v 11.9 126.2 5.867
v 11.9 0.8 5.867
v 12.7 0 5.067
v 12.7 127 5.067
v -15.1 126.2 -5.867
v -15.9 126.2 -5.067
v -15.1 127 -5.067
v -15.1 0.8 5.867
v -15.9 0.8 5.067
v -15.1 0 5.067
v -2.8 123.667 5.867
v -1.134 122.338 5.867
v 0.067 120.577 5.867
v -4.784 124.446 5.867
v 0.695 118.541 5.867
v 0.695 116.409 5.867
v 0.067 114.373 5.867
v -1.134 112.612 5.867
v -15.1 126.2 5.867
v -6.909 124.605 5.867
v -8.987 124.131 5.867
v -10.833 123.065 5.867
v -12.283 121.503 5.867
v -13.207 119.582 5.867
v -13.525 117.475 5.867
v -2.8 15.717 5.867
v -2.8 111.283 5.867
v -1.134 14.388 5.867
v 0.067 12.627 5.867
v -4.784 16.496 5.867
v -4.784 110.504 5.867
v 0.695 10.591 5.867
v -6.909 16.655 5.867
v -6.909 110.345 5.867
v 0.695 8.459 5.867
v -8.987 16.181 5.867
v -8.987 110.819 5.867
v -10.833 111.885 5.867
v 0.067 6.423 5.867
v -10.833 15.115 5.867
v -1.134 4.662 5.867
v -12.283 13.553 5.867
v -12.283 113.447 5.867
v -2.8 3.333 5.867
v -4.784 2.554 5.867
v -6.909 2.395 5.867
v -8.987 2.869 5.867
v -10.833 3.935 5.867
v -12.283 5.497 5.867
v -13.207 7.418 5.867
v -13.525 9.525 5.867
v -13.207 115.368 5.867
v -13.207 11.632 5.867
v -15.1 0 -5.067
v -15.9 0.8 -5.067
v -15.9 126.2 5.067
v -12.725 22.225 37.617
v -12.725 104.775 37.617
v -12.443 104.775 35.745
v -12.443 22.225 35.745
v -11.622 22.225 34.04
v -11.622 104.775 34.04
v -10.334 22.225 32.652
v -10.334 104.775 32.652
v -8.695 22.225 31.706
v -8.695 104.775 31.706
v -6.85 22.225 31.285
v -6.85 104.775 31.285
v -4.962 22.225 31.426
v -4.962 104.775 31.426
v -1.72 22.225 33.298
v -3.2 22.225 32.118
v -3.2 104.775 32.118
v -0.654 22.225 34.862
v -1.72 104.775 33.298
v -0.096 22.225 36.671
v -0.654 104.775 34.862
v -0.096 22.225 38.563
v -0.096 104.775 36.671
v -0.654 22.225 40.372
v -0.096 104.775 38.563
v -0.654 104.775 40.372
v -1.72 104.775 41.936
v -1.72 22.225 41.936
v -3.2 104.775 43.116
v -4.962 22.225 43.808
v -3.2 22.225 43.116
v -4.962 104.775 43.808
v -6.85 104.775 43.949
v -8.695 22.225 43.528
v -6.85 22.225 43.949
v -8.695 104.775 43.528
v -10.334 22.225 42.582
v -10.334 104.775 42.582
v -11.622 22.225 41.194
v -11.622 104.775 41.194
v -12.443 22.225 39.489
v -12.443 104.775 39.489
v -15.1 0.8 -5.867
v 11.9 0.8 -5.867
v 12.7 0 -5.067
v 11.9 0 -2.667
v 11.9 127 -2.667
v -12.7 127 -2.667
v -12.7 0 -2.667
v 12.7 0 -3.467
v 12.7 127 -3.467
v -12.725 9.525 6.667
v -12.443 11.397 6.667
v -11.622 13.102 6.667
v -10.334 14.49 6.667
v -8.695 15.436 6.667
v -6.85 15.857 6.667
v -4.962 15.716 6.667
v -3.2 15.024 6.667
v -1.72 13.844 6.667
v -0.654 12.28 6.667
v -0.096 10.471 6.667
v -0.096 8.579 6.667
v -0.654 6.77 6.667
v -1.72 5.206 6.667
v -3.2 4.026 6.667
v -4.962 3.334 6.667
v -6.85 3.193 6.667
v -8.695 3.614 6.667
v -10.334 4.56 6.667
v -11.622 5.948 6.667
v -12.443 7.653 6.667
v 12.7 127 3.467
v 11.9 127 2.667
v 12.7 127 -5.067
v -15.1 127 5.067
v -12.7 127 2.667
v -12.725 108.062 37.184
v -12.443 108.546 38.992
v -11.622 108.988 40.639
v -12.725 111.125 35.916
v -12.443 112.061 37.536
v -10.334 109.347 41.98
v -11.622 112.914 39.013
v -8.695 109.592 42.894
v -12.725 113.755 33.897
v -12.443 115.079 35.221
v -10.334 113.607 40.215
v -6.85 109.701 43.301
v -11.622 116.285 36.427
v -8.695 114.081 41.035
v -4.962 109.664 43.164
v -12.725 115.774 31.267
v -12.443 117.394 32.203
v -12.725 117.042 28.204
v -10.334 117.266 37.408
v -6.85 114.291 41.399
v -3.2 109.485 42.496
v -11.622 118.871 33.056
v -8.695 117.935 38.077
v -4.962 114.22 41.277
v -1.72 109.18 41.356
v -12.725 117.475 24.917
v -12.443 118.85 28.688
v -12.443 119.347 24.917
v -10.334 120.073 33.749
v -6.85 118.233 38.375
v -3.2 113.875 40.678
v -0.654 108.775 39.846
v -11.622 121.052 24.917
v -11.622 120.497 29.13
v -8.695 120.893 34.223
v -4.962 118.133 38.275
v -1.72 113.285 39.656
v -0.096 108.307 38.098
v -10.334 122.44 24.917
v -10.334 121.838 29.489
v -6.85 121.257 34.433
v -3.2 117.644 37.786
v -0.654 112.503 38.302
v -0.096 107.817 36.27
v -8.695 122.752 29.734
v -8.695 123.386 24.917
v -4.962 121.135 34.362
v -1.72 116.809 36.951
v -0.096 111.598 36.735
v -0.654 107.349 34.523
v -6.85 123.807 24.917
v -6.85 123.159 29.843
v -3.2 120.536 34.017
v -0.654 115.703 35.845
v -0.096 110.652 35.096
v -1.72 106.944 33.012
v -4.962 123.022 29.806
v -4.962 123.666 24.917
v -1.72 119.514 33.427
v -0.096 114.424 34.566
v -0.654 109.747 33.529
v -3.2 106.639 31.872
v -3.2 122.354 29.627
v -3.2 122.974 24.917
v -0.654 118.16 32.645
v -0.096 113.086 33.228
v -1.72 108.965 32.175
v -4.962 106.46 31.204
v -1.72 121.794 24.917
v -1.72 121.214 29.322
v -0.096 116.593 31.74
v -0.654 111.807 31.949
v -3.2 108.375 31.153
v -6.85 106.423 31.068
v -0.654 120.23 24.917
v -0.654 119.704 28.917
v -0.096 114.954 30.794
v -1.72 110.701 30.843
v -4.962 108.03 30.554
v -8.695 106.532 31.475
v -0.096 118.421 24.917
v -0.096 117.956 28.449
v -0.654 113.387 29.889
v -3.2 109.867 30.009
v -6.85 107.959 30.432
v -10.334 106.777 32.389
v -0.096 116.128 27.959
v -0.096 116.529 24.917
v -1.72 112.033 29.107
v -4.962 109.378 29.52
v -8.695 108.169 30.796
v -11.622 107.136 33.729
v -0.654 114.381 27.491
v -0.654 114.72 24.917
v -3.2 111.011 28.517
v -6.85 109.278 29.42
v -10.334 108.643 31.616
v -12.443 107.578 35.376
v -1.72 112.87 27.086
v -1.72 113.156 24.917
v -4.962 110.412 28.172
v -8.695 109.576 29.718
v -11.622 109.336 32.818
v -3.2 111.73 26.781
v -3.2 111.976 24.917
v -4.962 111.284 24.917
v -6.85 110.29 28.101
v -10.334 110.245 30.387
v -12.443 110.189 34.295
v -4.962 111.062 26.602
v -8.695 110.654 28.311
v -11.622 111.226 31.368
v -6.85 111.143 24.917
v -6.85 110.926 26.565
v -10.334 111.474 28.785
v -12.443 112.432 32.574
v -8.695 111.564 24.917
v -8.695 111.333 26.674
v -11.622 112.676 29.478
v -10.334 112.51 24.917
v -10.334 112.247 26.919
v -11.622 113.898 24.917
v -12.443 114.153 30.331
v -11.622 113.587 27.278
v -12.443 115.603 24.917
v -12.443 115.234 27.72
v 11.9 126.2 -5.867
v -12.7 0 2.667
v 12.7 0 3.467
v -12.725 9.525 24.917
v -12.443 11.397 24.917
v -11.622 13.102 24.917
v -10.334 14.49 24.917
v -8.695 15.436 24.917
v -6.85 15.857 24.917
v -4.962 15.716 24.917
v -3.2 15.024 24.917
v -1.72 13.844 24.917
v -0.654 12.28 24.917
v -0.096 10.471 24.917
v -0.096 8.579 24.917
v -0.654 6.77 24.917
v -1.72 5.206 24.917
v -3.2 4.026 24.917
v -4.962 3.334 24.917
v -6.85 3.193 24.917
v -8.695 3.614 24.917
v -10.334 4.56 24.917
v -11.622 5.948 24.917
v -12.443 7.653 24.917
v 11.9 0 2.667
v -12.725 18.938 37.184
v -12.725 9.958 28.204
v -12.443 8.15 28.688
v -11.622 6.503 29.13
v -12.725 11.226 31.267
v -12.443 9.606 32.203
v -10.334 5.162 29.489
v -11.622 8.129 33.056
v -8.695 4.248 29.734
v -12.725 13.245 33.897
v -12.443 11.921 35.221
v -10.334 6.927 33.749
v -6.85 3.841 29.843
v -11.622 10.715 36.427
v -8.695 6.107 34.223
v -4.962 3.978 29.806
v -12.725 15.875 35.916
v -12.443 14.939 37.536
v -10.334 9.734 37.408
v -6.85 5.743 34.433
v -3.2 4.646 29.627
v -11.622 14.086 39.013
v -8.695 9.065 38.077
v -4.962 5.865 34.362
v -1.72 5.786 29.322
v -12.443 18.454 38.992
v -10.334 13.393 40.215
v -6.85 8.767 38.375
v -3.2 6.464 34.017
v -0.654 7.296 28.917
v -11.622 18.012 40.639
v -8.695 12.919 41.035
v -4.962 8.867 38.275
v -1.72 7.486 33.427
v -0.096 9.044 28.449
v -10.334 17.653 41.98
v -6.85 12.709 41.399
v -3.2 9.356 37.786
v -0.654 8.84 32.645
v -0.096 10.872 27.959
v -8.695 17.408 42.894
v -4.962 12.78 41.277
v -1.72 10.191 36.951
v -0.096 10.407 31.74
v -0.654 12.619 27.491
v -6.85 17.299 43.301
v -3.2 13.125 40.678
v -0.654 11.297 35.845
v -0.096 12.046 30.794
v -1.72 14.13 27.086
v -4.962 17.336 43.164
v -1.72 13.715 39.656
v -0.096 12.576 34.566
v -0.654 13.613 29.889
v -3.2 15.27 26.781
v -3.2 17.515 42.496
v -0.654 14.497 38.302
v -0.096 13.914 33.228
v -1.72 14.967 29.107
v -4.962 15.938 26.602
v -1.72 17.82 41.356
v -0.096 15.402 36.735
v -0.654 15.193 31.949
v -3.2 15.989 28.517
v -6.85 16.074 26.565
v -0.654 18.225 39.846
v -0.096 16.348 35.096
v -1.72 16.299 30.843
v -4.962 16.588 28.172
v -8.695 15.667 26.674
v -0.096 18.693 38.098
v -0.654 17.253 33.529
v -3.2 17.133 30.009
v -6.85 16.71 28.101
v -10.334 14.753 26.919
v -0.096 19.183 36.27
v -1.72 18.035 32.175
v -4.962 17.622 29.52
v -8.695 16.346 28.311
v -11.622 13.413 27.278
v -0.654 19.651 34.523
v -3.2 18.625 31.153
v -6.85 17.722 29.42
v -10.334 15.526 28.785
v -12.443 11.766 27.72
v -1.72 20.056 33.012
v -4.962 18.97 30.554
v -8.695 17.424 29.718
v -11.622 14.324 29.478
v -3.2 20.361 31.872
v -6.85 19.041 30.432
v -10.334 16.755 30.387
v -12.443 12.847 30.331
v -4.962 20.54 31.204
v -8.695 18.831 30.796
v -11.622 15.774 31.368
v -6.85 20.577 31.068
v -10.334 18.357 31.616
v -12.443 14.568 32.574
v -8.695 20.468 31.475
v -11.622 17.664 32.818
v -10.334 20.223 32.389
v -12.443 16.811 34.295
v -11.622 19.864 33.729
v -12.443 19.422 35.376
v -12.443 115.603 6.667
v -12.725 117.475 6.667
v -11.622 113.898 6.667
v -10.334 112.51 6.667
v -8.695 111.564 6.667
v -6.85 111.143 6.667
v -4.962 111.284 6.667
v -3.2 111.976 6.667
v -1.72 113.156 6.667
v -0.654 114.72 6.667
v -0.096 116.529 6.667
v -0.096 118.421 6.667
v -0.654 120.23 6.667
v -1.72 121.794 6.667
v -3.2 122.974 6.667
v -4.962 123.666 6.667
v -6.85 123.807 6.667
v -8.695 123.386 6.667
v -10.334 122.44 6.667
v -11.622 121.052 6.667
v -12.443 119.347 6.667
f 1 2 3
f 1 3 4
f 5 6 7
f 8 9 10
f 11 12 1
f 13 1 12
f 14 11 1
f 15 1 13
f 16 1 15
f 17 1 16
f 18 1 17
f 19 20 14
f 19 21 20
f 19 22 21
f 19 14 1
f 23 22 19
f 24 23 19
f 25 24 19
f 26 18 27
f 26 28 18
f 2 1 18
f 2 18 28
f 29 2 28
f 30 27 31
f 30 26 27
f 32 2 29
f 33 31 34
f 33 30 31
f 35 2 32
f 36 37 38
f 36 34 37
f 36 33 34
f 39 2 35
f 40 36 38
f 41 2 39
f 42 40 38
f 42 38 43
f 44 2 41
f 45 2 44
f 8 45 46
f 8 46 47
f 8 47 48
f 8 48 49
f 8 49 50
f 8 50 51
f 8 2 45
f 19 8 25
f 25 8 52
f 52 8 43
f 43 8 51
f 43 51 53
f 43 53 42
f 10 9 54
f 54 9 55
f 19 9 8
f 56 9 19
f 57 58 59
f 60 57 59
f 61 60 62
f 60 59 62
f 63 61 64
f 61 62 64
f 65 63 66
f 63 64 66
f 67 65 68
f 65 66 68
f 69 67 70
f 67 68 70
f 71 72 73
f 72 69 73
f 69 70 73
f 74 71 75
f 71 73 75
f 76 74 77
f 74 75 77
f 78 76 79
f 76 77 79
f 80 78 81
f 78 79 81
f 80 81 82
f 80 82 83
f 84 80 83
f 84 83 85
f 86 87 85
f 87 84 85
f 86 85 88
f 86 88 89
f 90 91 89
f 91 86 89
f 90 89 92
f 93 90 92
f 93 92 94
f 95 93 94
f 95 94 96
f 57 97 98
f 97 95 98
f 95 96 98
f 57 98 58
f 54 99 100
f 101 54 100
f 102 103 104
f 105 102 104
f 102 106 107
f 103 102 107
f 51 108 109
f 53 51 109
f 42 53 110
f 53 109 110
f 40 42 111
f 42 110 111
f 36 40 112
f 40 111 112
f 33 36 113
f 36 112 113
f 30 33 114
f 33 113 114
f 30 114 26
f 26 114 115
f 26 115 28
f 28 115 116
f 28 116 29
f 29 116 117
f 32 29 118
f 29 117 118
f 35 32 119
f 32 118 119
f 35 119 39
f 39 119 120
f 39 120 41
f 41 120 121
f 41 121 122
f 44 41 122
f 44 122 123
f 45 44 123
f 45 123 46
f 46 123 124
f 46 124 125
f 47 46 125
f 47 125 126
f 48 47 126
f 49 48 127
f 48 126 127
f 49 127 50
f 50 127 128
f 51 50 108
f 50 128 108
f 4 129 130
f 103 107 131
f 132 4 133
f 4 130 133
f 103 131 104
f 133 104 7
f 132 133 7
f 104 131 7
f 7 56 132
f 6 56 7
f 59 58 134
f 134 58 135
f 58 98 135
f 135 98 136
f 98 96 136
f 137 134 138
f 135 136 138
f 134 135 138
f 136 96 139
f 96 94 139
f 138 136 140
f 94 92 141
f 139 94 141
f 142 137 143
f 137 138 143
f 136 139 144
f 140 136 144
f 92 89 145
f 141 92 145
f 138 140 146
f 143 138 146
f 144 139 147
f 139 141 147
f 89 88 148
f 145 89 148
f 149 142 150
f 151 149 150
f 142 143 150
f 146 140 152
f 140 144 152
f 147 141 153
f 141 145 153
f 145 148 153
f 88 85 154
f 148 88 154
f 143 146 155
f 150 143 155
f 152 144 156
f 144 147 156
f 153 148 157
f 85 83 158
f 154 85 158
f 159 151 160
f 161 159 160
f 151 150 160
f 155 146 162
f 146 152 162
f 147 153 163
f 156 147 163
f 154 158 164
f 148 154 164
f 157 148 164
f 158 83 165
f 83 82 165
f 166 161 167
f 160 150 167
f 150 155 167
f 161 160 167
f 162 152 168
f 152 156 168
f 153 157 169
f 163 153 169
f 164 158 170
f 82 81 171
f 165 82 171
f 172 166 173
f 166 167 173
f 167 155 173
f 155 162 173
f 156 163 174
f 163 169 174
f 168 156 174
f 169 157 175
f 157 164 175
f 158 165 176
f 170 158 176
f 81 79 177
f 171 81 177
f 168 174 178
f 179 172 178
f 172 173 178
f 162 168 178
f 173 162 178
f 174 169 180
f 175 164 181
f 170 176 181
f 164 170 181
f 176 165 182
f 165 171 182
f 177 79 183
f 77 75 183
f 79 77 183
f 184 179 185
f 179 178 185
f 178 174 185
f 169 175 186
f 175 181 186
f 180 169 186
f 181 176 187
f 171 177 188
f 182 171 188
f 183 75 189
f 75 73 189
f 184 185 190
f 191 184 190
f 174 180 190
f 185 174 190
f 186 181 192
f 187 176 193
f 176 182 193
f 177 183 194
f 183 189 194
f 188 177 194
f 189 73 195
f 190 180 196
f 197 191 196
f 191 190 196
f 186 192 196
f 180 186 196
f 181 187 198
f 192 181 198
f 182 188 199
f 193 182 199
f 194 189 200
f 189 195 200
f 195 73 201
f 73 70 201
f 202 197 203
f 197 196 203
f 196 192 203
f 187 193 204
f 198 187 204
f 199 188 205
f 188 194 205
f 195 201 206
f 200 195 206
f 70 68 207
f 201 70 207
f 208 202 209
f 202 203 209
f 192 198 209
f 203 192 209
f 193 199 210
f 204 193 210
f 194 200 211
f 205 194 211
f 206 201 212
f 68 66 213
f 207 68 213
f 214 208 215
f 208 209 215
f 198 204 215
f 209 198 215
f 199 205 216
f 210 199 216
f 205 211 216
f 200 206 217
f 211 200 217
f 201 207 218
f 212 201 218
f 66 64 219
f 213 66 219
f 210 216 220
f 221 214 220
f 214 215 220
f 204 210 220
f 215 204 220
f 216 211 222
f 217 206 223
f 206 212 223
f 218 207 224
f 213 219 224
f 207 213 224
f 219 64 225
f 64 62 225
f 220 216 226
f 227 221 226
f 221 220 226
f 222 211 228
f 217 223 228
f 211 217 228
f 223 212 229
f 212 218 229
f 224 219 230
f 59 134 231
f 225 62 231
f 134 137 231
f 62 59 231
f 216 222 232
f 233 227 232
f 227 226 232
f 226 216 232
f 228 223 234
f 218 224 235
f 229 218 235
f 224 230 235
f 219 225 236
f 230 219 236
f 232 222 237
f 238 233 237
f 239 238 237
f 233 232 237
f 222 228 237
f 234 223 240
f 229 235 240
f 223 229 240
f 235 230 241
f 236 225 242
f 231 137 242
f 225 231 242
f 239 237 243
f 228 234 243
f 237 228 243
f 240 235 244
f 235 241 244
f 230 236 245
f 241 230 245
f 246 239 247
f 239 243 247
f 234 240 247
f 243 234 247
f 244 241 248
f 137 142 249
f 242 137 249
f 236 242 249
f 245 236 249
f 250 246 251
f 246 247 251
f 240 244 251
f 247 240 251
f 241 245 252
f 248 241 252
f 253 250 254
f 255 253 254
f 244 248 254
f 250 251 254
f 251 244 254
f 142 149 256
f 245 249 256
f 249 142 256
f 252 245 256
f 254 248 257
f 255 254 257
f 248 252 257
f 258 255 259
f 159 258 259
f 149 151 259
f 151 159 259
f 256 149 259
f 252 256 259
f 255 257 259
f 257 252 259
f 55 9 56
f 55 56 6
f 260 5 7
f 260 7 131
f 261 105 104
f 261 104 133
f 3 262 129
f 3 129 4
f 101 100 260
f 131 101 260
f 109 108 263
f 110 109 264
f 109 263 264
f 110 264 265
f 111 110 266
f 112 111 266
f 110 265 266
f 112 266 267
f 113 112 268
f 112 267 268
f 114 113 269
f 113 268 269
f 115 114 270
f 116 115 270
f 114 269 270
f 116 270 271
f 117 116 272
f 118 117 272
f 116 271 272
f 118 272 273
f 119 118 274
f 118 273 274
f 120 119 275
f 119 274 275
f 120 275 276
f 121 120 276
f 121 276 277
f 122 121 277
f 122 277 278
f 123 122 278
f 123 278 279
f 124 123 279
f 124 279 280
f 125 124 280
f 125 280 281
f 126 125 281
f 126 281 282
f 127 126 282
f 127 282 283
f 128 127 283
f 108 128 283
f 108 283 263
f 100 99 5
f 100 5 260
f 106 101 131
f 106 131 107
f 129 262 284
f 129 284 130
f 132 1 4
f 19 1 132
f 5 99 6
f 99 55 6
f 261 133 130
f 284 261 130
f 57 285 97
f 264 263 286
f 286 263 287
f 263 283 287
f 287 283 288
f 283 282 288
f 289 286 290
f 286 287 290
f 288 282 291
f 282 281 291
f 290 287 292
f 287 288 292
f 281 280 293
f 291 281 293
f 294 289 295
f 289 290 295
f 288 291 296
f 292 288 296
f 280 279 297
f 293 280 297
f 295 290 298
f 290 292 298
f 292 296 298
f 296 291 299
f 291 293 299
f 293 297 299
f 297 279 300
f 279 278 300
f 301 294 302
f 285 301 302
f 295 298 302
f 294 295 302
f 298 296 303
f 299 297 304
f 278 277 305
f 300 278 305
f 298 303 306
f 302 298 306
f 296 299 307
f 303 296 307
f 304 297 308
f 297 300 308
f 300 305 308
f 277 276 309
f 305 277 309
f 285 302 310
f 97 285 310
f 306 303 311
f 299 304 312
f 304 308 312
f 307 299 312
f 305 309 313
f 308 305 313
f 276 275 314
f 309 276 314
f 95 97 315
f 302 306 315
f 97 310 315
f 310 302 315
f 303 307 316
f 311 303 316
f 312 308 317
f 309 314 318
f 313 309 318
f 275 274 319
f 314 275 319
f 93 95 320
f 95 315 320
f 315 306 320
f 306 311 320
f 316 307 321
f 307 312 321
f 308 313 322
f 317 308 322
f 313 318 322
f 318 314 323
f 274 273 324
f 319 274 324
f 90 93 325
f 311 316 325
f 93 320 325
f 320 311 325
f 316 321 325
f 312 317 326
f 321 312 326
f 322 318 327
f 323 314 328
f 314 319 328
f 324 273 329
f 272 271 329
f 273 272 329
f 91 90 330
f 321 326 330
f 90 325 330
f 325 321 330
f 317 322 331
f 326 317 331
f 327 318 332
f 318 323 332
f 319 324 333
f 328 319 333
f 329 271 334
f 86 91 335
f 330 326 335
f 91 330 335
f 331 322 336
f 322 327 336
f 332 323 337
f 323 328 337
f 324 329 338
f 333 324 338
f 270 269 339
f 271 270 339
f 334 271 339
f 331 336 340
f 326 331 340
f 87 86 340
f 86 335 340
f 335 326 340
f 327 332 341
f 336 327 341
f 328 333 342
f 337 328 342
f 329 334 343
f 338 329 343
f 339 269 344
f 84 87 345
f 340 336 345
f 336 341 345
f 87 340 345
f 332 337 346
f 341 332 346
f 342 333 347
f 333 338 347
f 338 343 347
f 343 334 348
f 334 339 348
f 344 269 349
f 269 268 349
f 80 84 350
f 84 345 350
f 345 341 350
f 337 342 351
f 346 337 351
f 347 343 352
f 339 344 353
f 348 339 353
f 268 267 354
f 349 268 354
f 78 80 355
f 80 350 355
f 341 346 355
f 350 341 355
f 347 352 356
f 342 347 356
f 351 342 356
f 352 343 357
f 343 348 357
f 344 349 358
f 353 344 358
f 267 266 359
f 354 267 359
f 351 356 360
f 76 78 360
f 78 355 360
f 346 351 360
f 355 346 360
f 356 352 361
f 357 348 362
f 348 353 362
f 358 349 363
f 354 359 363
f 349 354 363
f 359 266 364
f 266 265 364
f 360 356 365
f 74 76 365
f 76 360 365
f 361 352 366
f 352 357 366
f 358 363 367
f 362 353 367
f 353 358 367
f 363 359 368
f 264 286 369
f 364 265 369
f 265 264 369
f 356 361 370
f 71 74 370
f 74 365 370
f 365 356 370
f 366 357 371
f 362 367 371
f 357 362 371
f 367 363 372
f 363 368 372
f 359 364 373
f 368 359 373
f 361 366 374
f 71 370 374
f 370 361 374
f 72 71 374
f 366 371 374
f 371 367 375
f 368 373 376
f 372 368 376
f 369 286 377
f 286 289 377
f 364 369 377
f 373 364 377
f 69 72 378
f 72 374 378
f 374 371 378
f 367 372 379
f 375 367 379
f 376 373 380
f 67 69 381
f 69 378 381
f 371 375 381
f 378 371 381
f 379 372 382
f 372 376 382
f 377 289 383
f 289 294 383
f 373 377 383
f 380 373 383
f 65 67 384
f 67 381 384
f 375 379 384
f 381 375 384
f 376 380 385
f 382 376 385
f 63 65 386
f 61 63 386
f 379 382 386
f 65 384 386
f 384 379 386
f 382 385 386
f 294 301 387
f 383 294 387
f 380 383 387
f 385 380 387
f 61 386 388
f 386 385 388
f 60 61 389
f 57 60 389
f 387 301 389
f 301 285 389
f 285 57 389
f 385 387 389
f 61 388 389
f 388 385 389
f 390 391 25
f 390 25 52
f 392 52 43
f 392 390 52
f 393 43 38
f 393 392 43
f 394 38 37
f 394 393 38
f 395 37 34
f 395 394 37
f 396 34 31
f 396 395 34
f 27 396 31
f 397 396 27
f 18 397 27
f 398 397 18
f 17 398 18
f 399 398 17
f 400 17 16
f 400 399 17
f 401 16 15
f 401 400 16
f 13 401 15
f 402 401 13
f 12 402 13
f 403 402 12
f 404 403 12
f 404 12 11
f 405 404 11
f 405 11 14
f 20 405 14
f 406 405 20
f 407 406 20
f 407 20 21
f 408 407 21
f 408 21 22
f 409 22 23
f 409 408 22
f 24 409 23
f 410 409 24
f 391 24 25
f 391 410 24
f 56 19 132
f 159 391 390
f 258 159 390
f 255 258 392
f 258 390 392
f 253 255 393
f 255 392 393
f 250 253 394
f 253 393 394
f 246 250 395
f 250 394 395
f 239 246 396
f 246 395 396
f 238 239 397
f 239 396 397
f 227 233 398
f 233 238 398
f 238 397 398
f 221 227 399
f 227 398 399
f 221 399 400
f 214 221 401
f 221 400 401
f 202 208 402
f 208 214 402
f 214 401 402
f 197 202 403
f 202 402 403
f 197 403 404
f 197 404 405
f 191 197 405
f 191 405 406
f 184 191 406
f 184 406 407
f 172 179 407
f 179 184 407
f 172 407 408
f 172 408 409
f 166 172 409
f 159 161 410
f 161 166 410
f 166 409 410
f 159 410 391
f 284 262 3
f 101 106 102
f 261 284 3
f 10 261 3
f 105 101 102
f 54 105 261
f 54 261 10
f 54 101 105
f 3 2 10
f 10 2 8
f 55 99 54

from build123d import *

# Parameters (mm, degrees)
BOSS_EXTRUDE1_DEPTH = 127
SKETCH2_R           = 6.35
CHAMFER1_SIZE       = 0.8


with BuildPart() as part:
    # Sketch1 → Boss-Extrude1 (new body)
    with BuildSketch(Plane(origin=(0, 0, 0), x_dir=(1, 0, 0), z_dir=(0, 1, 0))):
        Polygon((-12.7, 2.667), (12.7, 2.667), (12.7, -2.667), (-12.7, -2.667), (-12.7, -5.867), (15.9, -5.867), (15.9, 5.867), (-12.7, 5.867), align=None)
    extrude(amount=BOSS_EXTRUDE1_DEPTH)

    # Sweep1: sweep along a curve in space
    with BuildLine() as sweep1_path:
        Line((6.375, 9.525, 5.867), (6.375, 9.525, 24.917))
        ThreePointArc((6.375, 9.525, 24.917), (6.375, 13.244743879, 33.897256121), (6.375, 22.225, 37.617))
        Line((6.375, 22.225, 37.617), (6.375, 104.775, 37.617))
        ThreePointArc((6.375, 104.775, 37.617), (6.375, 113.755256121, 33.897256121), (6.375, 117.475, 24.917))
        Line((6.375, 117.475, 24.917), (6.375, 117.475, 5.867))
    # Sketch2 → Sweep1 (sweep)
    with BuildSketch(Plane.XY.offset(5.867)):
        with Locations((6.375, 9.525)):
            Circle(SKETCH2_R)
    sweep(path=sweep1_path.line)

    # Chamfer1
    chamfer1_edges = [part.edges().sort_by_distance(p)[0] for p in [
        (-12.7, 63.5, -5.867),
        (15.9, 63.5, -5.867),
        (15.9, 63.5, 5.867),
        (-12.7, 63.5, 5.867),
        (-12.7, 63.5, 2.667),
        (-12.7, 63.5, -2.667),
        (1.6, 127, 5.867),
        (0.025, 9.525, 5.867),
        (0.025, 117.475, 5.867),
        (15.9, 127, 0),
        (1.6, 127, -5.867),
        (1.6, 0, -5.867),
        (15.9, 0, 0),
        (1.6, 0, 5.867),
    ]]
    chamfer(chamfer1_edges, length=CHAMFER1_SIZE)


with BuildPart() as body_2:
    # Mirror3: mirrored copy
    add(part.part.mirror(Plane(origin=(0, 0, 0), x_dir=(0, 0, 1), z_dir=(1, 0, 0))))


solid = body_2.part
